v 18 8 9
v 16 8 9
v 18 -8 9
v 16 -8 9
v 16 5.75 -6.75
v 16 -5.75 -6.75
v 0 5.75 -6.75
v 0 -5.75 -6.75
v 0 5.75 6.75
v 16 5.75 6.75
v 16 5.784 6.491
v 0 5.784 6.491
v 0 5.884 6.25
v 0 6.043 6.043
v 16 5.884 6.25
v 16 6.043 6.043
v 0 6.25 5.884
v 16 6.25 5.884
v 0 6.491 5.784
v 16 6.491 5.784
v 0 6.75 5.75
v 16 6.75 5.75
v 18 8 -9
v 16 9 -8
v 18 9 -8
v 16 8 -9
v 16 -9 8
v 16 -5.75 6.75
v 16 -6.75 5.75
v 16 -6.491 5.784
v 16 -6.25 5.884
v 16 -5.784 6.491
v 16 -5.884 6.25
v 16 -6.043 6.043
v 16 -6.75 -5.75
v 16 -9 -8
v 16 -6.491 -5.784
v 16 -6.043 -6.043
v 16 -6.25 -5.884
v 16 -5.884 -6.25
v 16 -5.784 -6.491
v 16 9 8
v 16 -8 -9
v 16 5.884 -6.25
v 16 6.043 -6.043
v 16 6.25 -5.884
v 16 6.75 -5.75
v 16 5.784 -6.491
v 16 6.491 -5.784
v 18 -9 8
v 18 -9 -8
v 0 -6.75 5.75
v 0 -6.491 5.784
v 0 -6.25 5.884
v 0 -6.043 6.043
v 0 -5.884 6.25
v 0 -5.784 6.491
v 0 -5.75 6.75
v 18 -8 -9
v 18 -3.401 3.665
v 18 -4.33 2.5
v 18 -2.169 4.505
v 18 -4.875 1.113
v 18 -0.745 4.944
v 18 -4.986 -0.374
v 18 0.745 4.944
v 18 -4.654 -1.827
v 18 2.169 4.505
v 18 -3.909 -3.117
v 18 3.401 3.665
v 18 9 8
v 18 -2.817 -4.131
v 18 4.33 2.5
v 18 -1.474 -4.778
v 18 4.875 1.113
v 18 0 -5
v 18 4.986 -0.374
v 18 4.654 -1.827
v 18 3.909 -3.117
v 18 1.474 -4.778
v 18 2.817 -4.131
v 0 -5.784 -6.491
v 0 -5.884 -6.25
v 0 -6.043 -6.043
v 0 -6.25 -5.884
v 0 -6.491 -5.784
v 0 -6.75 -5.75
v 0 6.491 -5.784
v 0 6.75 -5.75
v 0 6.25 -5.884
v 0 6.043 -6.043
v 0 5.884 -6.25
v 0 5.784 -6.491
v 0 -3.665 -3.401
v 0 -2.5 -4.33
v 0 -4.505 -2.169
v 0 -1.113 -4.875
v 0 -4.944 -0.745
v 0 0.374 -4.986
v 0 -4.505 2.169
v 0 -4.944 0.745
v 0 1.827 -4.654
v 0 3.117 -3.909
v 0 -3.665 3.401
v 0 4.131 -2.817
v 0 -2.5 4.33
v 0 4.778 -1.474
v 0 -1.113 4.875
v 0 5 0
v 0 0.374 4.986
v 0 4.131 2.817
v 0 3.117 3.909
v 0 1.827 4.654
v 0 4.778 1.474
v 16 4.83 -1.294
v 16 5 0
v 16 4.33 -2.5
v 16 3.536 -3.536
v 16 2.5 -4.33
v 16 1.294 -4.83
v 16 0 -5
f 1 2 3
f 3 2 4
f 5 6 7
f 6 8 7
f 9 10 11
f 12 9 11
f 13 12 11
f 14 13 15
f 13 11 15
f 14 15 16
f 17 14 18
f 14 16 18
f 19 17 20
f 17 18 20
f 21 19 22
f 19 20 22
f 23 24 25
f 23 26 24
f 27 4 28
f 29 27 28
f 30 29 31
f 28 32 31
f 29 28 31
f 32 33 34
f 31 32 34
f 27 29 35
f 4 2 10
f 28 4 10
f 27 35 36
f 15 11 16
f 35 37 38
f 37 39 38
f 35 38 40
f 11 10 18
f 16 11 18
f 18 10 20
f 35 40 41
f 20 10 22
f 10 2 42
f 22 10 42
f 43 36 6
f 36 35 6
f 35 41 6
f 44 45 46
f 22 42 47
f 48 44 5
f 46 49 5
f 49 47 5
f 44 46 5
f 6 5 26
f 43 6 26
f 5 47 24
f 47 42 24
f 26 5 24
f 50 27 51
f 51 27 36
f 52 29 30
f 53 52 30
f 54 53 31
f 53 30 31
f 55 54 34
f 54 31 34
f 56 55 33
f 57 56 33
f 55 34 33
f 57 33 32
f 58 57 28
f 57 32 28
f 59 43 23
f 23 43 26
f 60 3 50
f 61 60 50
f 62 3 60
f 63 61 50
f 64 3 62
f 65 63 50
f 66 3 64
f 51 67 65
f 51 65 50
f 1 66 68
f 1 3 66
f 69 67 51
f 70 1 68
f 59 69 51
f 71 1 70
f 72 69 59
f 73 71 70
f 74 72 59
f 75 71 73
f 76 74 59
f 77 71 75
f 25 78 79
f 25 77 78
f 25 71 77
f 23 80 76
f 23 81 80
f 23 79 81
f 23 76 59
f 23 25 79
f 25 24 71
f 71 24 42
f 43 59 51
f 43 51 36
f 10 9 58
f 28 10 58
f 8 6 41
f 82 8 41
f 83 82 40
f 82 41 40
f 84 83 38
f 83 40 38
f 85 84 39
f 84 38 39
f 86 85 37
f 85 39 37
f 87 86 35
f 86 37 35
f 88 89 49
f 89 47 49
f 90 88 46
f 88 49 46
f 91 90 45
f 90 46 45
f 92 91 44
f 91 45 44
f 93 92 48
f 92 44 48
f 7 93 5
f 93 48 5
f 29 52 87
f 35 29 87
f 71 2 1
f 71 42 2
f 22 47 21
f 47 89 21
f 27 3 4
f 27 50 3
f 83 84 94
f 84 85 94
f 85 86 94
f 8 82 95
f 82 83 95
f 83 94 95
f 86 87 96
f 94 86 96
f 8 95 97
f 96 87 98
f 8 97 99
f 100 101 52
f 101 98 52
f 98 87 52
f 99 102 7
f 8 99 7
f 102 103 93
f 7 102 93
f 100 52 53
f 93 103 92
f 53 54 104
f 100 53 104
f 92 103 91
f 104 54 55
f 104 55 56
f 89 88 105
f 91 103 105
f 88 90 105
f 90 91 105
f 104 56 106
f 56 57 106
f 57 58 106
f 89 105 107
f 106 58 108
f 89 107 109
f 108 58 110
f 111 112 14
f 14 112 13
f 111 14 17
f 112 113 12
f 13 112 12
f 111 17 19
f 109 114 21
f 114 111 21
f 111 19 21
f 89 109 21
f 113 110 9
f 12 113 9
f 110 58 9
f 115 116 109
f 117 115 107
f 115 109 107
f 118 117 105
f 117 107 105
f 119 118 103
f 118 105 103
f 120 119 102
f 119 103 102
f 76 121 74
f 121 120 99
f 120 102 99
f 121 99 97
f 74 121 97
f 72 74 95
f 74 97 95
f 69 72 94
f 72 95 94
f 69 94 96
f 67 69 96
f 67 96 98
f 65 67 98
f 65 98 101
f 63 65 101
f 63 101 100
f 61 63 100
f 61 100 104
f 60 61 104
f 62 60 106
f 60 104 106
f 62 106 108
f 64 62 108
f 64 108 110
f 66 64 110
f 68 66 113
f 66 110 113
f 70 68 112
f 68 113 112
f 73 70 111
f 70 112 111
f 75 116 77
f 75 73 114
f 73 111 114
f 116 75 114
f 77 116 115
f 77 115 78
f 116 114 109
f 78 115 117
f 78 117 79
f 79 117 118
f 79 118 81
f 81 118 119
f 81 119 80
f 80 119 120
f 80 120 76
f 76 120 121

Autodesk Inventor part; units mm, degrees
ref_plane "YZ Plane" through (0, 0, 0) normal (1, 0, 0) x (0, 1, 0)
ref_plane "XZ Plane" through (0, 0, 0) normal (0, 1, 0) x (-1, 0, 0)
ref_plane "XY Plane" through (0, 0, 0) normal (0, 0, 1) x (1, 0, 0)
sketch "Эскиз1" plane through (0, 0, 0) normal (1, 0, 0) x (0, 1, 0)
  line L0 (6.75, 6.75) -> (-6.75, 6.75)
  line L1 (-6.75, 6.75) -> (-6.75, -6.75)
  line L2 (-6.75, -6.75) -> (6.75, -6.75)
  line L3 (6.75, -6.75) -> (6.75, 6.75)
  circle A0 centre (0, 0) radius 5
  dimension "d0" = 13.5
  dimension "d1" = 13.5
  dimension "d2" = 6.75
  dimension "d3" = 6.75
  dimension "d4" = 10
extrude "Выдавливание1" add sketch "Эскиз1" along normal blind 16
ref_plane "РабПлоскость1" through (16, 0, 0) normal (1, 0, 0) x (0, 0, -1)
sketch "Эскиз2" plane through (16, 0, 0) normal (1, 0, 0) x (0, 0, -1)
  line L0 (6.75, -6.75) -> (6.75, 6.75) projected
  circle A0 centre (6.75, 6.75) radius 1
  line L1 (6.75, 6.75) -> (-6.75, 6.75) projected
  circle A1 centre (-6.75, 6.75) radius 1
  line L2 (-6.75, -6.75) -> (6.75, -6.75) projected
  circle A2 centre (-6.75, -6.75) radius 1
  circle A3 centre (6.75, -6.75) radius 1
  point P0 (0, 0)
  dimension "d8" = 2
  dimension "d9" = 2
  dimension "d10" = 2
  dimension "d11" = 2
extrude "Выдавливание2" cut sketch "Эскиз2" against normal blind 16
sketch "Эскиз3" plane through (16, 0, 0) normal (1, 0, 0) x (0, 0, -1)
  line L0 (-9, -9) -> (9, -9)
  line L1 (9, -9) -> (9, 9)
  line L2 (9, 9) -> (-9, 9)
  line L3 (-9, 9) -> (-9, -9)
  line L4 (-9, -9) -> (9, 9) construction
  line L5 (9, -9) -> (-9, 9) construction
  circle A0 centre (0, 0) radius 5
  dimension "d14" = 18
  dimension "d15" = 18
extrude "Выдавливание3" add sketch "Эскиз3" along normal blind 2
chamfer "Фаска1" distance 1 angle 45 4 edges at (17, 9, 9) (17, 9, -9) (17, -9, 9) (17, -9, -9)
properties part number "переходник"
